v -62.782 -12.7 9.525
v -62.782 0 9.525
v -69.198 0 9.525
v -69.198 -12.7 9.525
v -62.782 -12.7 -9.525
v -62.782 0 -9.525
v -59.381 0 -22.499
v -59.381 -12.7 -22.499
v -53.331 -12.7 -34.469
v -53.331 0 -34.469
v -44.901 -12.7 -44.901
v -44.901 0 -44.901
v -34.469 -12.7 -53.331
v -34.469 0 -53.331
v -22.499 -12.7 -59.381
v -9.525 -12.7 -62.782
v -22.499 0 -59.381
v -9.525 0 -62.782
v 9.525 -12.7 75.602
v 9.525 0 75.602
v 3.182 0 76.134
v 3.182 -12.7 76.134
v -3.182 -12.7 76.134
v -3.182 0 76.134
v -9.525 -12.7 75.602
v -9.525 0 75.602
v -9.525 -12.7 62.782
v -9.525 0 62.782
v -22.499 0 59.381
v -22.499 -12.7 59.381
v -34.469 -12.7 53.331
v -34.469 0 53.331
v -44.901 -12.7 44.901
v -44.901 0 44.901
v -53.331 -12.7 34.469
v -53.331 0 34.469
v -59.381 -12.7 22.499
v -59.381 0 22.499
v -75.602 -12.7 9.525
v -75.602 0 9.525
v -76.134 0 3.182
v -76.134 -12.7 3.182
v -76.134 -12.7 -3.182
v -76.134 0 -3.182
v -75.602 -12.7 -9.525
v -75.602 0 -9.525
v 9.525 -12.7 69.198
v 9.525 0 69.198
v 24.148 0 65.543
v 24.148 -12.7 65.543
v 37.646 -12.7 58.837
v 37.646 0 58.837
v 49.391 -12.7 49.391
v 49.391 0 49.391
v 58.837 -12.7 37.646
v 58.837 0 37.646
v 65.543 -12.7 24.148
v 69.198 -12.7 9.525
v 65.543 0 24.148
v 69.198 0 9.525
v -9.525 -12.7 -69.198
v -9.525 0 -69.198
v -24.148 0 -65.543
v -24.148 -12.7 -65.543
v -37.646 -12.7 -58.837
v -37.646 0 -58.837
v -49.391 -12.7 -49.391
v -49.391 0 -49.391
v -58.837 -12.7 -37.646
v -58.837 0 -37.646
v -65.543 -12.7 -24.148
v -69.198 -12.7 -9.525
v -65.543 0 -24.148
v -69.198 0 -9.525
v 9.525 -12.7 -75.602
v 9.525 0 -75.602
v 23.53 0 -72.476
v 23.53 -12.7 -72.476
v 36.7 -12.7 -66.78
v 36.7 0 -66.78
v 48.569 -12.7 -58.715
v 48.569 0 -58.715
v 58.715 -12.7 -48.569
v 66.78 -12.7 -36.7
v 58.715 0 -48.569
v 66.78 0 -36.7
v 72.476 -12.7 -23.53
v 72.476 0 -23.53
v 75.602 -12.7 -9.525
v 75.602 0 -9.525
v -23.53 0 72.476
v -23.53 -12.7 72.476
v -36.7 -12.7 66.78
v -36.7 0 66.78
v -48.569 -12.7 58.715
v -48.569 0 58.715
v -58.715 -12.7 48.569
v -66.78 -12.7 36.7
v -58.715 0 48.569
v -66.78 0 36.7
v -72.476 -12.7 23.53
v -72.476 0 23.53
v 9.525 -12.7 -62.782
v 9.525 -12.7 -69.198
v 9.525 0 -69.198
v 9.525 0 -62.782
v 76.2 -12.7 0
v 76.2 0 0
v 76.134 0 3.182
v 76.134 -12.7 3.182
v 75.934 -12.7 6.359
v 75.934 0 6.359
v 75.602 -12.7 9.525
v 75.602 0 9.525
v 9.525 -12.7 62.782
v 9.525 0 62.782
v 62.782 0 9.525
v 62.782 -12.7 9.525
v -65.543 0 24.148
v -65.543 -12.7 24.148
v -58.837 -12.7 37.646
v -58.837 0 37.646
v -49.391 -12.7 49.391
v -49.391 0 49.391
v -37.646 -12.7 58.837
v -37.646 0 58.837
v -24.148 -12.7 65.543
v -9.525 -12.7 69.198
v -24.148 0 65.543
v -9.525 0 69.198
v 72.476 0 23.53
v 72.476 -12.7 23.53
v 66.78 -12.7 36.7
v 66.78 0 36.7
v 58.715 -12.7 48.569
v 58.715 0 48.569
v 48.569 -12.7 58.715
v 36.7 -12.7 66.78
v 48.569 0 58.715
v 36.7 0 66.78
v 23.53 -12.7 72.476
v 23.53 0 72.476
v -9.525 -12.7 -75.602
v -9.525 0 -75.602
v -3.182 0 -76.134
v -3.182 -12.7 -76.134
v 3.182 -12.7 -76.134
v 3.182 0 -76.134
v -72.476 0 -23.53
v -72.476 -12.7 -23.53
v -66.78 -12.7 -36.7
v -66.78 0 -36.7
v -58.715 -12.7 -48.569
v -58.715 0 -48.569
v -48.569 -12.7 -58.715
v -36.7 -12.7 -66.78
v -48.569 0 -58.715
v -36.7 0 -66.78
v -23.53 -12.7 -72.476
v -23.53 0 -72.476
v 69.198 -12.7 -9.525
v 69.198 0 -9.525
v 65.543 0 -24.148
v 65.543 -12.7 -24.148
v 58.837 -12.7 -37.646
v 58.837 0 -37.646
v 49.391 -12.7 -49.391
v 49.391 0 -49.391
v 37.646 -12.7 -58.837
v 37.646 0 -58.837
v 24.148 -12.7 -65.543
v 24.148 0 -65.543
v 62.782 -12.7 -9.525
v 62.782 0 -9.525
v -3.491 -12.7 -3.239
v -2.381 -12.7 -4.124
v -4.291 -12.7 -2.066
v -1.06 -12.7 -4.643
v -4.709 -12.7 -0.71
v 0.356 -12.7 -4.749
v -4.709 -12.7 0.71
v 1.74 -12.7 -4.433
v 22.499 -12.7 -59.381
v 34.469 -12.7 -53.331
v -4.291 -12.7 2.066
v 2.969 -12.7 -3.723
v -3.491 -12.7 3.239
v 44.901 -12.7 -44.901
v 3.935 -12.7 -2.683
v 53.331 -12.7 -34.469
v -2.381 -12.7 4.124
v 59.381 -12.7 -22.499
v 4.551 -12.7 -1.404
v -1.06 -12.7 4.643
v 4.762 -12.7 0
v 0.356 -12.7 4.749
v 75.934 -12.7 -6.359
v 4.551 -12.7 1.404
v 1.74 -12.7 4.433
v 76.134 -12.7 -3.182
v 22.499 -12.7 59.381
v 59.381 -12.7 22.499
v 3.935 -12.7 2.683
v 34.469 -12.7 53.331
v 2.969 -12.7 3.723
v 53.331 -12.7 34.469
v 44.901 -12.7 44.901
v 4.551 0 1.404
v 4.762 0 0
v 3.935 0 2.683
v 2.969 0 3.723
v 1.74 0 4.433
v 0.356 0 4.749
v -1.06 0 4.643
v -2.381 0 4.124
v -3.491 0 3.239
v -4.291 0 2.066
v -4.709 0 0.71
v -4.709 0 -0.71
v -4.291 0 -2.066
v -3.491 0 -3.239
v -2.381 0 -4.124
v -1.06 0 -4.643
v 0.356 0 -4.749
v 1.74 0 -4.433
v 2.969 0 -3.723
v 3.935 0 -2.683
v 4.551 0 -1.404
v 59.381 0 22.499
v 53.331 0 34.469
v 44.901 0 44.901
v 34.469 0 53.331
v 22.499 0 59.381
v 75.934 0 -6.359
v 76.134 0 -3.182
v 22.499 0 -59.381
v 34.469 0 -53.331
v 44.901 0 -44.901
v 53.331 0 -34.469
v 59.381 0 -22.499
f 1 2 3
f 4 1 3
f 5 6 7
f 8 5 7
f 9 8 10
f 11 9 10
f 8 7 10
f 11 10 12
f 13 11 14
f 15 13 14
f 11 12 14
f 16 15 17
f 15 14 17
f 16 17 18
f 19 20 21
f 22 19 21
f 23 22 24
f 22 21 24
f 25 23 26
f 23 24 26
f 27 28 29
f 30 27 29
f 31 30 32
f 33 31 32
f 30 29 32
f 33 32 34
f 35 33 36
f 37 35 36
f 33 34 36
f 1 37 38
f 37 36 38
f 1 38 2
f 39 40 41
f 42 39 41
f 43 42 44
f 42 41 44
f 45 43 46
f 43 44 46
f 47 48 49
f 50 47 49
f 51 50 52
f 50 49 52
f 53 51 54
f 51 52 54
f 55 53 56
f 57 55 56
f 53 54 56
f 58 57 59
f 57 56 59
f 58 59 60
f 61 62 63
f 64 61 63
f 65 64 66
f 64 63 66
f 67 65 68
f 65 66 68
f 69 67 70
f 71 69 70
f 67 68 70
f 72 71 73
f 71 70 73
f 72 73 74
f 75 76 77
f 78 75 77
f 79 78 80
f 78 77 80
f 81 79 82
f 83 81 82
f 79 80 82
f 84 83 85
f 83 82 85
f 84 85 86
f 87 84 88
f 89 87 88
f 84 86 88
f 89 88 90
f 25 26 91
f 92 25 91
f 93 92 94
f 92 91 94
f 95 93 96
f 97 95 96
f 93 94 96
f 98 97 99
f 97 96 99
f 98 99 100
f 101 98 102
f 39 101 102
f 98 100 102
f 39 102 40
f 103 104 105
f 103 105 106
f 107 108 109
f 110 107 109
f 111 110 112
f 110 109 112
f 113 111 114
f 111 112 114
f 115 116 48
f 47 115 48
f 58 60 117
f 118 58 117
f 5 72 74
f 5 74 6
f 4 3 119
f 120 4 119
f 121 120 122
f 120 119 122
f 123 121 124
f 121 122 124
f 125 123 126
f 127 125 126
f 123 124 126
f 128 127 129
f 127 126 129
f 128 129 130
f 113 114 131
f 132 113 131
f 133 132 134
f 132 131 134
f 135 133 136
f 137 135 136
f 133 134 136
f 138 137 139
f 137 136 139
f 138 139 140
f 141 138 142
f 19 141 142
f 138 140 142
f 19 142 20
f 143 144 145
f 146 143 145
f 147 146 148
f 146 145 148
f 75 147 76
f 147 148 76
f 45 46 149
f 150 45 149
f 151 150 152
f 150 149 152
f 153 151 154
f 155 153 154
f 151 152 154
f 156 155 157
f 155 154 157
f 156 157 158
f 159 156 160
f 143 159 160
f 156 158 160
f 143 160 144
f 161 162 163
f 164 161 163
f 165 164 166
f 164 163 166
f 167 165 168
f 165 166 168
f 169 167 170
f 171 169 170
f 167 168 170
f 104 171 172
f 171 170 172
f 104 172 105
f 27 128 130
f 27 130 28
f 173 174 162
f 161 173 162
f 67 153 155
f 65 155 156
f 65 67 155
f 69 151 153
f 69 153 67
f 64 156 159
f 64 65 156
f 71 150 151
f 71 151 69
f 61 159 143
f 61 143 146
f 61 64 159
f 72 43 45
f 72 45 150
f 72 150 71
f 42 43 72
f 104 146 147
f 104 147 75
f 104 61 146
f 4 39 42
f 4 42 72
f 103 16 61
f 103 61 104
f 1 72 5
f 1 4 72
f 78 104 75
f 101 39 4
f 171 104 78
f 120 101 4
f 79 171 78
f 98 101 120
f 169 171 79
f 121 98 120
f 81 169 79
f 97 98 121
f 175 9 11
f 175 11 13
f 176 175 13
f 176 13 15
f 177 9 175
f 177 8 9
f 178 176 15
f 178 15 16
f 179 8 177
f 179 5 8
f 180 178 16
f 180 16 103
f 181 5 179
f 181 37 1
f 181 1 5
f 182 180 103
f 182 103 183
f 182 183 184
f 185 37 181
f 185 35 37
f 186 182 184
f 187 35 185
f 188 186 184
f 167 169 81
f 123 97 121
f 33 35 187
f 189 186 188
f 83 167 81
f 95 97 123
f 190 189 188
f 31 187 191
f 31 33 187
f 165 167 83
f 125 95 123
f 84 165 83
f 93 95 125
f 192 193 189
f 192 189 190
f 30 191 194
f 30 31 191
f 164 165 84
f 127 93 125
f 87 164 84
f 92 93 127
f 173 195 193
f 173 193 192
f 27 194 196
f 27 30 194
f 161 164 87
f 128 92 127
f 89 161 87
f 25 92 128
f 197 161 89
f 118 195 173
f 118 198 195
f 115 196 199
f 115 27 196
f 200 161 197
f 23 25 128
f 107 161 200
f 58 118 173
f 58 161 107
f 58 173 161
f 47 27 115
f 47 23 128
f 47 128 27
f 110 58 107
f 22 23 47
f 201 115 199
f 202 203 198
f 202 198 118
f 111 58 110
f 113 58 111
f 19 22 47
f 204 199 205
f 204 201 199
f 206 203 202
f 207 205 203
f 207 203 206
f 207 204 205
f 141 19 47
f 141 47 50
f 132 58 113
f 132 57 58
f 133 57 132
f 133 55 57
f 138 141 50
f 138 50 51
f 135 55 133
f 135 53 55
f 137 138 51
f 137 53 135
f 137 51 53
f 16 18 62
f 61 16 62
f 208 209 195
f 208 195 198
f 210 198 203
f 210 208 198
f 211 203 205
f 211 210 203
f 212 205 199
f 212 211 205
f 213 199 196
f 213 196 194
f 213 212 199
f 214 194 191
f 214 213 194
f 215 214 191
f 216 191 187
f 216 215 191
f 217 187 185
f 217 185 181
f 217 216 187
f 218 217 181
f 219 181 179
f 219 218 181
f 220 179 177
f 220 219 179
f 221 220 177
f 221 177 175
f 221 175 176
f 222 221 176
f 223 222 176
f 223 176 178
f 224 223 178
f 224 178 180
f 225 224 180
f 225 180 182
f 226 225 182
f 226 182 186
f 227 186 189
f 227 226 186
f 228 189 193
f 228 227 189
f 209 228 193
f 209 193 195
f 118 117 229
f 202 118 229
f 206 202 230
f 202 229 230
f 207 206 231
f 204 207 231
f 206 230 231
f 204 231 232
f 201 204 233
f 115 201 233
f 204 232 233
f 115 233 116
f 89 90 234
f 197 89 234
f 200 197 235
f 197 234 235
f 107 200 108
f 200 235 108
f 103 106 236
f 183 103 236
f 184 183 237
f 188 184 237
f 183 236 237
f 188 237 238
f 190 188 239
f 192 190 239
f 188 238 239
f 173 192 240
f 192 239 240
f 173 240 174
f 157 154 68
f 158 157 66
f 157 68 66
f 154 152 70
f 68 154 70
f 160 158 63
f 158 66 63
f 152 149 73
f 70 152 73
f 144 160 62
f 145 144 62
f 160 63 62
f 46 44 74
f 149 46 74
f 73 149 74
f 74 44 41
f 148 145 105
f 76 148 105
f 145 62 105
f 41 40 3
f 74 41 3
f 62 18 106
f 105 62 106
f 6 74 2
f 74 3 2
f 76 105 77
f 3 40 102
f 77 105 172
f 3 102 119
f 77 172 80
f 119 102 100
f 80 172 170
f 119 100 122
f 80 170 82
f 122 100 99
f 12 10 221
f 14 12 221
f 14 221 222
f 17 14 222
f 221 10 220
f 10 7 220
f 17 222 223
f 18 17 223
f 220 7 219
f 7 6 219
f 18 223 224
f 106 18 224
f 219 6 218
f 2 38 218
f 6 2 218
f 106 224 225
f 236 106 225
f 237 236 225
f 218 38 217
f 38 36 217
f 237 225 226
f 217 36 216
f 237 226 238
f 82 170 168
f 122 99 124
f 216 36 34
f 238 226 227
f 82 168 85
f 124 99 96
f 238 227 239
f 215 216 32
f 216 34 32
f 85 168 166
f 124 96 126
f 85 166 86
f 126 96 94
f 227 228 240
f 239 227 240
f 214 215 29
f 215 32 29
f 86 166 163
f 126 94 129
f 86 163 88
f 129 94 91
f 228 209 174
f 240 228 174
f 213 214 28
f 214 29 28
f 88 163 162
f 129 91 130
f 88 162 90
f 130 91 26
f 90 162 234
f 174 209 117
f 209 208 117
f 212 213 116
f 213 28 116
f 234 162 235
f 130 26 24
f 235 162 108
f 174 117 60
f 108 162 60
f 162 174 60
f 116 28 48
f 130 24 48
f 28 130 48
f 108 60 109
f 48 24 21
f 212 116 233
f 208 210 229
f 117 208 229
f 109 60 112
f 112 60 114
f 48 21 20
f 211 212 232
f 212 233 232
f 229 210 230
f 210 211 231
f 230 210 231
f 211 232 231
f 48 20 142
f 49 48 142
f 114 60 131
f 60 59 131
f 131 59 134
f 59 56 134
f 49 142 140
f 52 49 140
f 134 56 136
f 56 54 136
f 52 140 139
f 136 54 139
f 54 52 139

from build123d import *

# Parameters (mm, degrees)
F0_W     = 19.05
F0_H     = 19.05
F0_R     = 4.7625
F1_DEPTH = 12.7


with BuildPart() as f1:
    # F0 (on Front) → F1 (new body)
    with BuildSketch(Plane.XZ):
        with BuildLine():
            ThreePointArc((75.6023437137, -9.525), (76.0504391538, -4.7718659358), (76.2, 0))
            ThreePointArc((76.2, 0), (76.0504391538, 4.7718659358), (75.6023437137, 9.525))
            Line((75.6023437137, 9.525), (69.1975207287, 9.525))
            ThreePointArc((69.1975207287, 9.525), (69.6866892703, 4.7736609169), (69.85, 0))
            ThreePointArc((69.85, 0), (69.6866892703, -4.7736609169), (69.1975207287, -9.525))
            Line((69.1975207287, -9.525), (75.6023437137, -9.525))
        make_face()
        with BuildLine():
            Line((69.1975207287, 9.525), (75.6023437137, 9.525))
            ThreePointArc((75.6023437137, 9.525), (53.8815367264, 53.8815367264), (9.525, 75.6023437137))
            Line((9.525, 75.6023437137), (9.525, 69.1975207287))
            ThreePointArc((9.525, 69.1975207287), (49.3914086659, 49.3914086659), (69.1975207287, 9.525))
        make_face()
        with BuildLine():
            ThreePointArc((9.525, -75.6023437137), (53.8815367264, -53.8815367264), (75.6023437137, -9.525))
            Line((75.6023437137, -9.525), (69.1975207287, -9.525))
            ThreePointArc((69.1975207287, -9.525), (49.3914086659, -49.3914086659), (9.525, -69.1975207287))
            Line((9.525, -69.1975207287), (9.525, -75.6023437137))
        make_face()
        with BuildLine():
            Line((9.525, 69.1975207287), (9.525, 75.6023437137))
            ThreePointArc((9.525, 75.6023437137), (0, 76.2), (-9.525, 75.6023437137))
            Line((-9.525, 75.6023437137), (-9.525, 69.1975207287))
            ThreePointArc((-9.525, 69.1975207287), (0, 69.85), (9.525, 69.1975207287))
        make_face()
        with BuildLine():
            ThreePointArc((-9.525, -75.6023437137), (0, -76.2), (9.525, -75.6023437137))
            Line((9.525, -75.6023437137), (9.525, -69.1975207287))
            ThreePointArc((9.525, -69.1975207287), (0, -69.85), (-9.525, -69.1975207287))
            Line((-9.525, -69.1975207287), (-9.525, -75.6023437137))
        make_face()
        with BuildLine():
            Line((-9.525, 69.1975207287), (-9.525, 75.6023437137))
            ThreePointArc((-9.525, 75.6023437137), (-53.8815367264, 53.8815367264), (-75.6023437137, 9.525))
            Line((-75.6023437137, 9.525), (-69.1975207287, 9.525))
            ThreePointArc((-69.1975207287, 9.525), (-49.3914086659, 49.3914086659), (-9.525, 69.1975207287))
        make_face()
        with BuildLine():
            ThreePointArc((-75.6023437137, -9.525), (-53.8815367264, -53.8815367264), (-9.525, -75.6023437137))
            Line((-9.525, -75.6023437137), (-9.525, -69.1975207287))
            ThreePointArc((-9.525, -69.1975207287), (-49.3914086659, -49.3914086659), (-69.1975207287, -9.525))
            Line((-69.1975207287, -9.525), (-75.6023437137, -9.525))
        make_face()
        with BuildLine():
            Line((-69.1975207287, 9.525), (-75.6023437137, 9.525))
            ThreePointArc((-75.6023437137, 9.525), (-76.2, 0), (-75.6023437137, -9.525))
            Line((-75.6023437137, -9.525), (-69.1975207287, -9.525))
            ThreePointArc((-69.1975207287, -9.525), (-69.85, 0), (-69.1975207287, 9.525))
        make_face()
        with BuildLine():
            Line((-9.525, 9.525), (-9.525, 62.7815607882))
            ThreePointArc((-9.525, 62.7815607882), (-44.9012806053, 44.9012806053), (-62.7815607882, 9.525))
            Line((-62.7815607882, 9.525), (-9.525, 9.525))
        make_face()
        with BuildLine():
            Line((9.525, 9.525), (62.7815607882, 9.525))
            ThreePointArc((62.7815607882, 9.525), (44.9012806053, 44.9012806053), (9.525, 62.7815607882))
            Line((9.525, 62.7815607882), (9.525, 9.525))
        make_face()
        with BuildLine():
            ThreePointArc((9.525, -62.7815607882), (44.9012806053, -44.9012806053), (62.7815607882, -9.525))
            Line((62.7815607882, -9.525), (9.525, -9.525))
            Line((9.525, -9.525), (9.525, -62.7815607882))
        make_face()
        with BuildLine():
            ThreePointArc((-62.7815607882, -9.525), (-44.9012806053, -44.9012806053), (-9.525, -62.7815607882))
            Line((-9.525, -62.7815607882), (-9.525, -9.525))
            Line((-9.525, -9.525), (-62.7815607882, -9.525))
        make_face()
        with BuildLine():
            Line((-9.525, -9.525), (-9.525, 9.525))
            Line((-9.525, 9.525), (-62.7815607882, 9.525))
            ThreePointArc((-62.7815607882, 9.525), (-63.5, 0), (-62.7815607882, -9.525))
            Line((-62.7815607882, -9.525), (-9.525, -9.525))
        make_face()
        with BuildLine():
            ThreePointArc((63.5, 0), (63.3201354628, 4.776028159), (62.7815607882, 9.525))
            Line((62.7815607882, 9.525), (9.525, 9.525))
            Line((9.525, 9.525), (9.525, -9.525))
            Line((9.525, -9.525), (62.7815607882, -9.525))
            ThreePointArc((62.7815607882, -9.525), (63.3201354628, -4.776028159), (63.5, 0))
        make_face()
        with BuildLine():
            Line((9.525, 9.525), (9.525, 62.7815607882))
            ThreePointArc((9.525, 62.7815607882), (0, 63.5), (-9.525, 62.7815607882))
            Line((-9.525, 62.7815607882), (-9.525, 9.525))
            Line((-9.525, 9.525), (9.525, 9.525))
        make_face()
        with BuildLine():
            ThreePointArc((-9.525, -62.7815607882), (0, -63.5), (9.525, -62.7815607882))
            Line((9.525, -62.7815607882), (9.525, -9.525))
            Line((9.525, -9.525), (-9.525, -9.525))
            Line((-9.525, -9.525), (-9.525, -62.7815607882))
        make_face()
        Rectangle(F0_W, F0_H)
        Circle(F0_R, mode=Mode.SUBTRACT)
        with BuildLine():
            Line((9.525, 62.7815607882), (9.525, 69.1975207287))
            ThreePointArc((9.525, 69.1975207287), (0, 69.85), (-9.525, 69.1975207287))
            Line((-9.525, 69.1975207287), (-9.525, 62.7815607882))
            ThreePointArc((-9.525, 62.7815607882), (0, 63.5), (9.525, 62.7815607882))
        make_face()
        with BuildLine():
            Line((-62.7815607882, 9.525), (-69.1975207287, 9.525))
            ThreePointArc((-69.1975207287, 9.525), (-69.85, 0), (-69.1975207287, -9.525))
            Line((-69.1975207287, -9.525), (-62.7815607882, -9.525))
            ThreePointArc((-62.7815607882, -9.525), (-63.5, 0), (-62.7815607882, 9.525))
        make_face()
        with BuildLine():
            ThreePointArc((-9.525, -69.1975207287), (0, -69.85), (9.525, -69.1975207287))
            Line((9.525, -69.1975207287), (9.525, -62.7815607882))
            ThreePointArc((9.525, -62.7815607882), (0, -63.5), (-9.525, -62.7815607882))
            Line((-9.525, -62.7815607882), (-9.525, -69.1975207287))
        make_face()
        with BuildLine():
            ThreePointArc((69.85, 0), (69.6866892703, 4.7736609169), (69.1975207287, 9.525))
            Line((69.1975207287, 9.525), (62.7815607882, 9.525))
            ThreePointArc((62.7815607882, 9.525), (63.3201354628, 4.776028159), (63.5, 0))
            ThreePointArc((63.5, 0), (63.3201354628, -4.776028159), (62.7815607882, -9.525))
            Line((62.7815607882, -9.525), (69.1975207287, -9.525))
            ThreePointArc((69.1975207287, -9.525), (69.6866892703, -4.7736609169), (69.85, 0))
        make_face()
    extrude(amount=F1_DEPTH)


solid = f1.part
